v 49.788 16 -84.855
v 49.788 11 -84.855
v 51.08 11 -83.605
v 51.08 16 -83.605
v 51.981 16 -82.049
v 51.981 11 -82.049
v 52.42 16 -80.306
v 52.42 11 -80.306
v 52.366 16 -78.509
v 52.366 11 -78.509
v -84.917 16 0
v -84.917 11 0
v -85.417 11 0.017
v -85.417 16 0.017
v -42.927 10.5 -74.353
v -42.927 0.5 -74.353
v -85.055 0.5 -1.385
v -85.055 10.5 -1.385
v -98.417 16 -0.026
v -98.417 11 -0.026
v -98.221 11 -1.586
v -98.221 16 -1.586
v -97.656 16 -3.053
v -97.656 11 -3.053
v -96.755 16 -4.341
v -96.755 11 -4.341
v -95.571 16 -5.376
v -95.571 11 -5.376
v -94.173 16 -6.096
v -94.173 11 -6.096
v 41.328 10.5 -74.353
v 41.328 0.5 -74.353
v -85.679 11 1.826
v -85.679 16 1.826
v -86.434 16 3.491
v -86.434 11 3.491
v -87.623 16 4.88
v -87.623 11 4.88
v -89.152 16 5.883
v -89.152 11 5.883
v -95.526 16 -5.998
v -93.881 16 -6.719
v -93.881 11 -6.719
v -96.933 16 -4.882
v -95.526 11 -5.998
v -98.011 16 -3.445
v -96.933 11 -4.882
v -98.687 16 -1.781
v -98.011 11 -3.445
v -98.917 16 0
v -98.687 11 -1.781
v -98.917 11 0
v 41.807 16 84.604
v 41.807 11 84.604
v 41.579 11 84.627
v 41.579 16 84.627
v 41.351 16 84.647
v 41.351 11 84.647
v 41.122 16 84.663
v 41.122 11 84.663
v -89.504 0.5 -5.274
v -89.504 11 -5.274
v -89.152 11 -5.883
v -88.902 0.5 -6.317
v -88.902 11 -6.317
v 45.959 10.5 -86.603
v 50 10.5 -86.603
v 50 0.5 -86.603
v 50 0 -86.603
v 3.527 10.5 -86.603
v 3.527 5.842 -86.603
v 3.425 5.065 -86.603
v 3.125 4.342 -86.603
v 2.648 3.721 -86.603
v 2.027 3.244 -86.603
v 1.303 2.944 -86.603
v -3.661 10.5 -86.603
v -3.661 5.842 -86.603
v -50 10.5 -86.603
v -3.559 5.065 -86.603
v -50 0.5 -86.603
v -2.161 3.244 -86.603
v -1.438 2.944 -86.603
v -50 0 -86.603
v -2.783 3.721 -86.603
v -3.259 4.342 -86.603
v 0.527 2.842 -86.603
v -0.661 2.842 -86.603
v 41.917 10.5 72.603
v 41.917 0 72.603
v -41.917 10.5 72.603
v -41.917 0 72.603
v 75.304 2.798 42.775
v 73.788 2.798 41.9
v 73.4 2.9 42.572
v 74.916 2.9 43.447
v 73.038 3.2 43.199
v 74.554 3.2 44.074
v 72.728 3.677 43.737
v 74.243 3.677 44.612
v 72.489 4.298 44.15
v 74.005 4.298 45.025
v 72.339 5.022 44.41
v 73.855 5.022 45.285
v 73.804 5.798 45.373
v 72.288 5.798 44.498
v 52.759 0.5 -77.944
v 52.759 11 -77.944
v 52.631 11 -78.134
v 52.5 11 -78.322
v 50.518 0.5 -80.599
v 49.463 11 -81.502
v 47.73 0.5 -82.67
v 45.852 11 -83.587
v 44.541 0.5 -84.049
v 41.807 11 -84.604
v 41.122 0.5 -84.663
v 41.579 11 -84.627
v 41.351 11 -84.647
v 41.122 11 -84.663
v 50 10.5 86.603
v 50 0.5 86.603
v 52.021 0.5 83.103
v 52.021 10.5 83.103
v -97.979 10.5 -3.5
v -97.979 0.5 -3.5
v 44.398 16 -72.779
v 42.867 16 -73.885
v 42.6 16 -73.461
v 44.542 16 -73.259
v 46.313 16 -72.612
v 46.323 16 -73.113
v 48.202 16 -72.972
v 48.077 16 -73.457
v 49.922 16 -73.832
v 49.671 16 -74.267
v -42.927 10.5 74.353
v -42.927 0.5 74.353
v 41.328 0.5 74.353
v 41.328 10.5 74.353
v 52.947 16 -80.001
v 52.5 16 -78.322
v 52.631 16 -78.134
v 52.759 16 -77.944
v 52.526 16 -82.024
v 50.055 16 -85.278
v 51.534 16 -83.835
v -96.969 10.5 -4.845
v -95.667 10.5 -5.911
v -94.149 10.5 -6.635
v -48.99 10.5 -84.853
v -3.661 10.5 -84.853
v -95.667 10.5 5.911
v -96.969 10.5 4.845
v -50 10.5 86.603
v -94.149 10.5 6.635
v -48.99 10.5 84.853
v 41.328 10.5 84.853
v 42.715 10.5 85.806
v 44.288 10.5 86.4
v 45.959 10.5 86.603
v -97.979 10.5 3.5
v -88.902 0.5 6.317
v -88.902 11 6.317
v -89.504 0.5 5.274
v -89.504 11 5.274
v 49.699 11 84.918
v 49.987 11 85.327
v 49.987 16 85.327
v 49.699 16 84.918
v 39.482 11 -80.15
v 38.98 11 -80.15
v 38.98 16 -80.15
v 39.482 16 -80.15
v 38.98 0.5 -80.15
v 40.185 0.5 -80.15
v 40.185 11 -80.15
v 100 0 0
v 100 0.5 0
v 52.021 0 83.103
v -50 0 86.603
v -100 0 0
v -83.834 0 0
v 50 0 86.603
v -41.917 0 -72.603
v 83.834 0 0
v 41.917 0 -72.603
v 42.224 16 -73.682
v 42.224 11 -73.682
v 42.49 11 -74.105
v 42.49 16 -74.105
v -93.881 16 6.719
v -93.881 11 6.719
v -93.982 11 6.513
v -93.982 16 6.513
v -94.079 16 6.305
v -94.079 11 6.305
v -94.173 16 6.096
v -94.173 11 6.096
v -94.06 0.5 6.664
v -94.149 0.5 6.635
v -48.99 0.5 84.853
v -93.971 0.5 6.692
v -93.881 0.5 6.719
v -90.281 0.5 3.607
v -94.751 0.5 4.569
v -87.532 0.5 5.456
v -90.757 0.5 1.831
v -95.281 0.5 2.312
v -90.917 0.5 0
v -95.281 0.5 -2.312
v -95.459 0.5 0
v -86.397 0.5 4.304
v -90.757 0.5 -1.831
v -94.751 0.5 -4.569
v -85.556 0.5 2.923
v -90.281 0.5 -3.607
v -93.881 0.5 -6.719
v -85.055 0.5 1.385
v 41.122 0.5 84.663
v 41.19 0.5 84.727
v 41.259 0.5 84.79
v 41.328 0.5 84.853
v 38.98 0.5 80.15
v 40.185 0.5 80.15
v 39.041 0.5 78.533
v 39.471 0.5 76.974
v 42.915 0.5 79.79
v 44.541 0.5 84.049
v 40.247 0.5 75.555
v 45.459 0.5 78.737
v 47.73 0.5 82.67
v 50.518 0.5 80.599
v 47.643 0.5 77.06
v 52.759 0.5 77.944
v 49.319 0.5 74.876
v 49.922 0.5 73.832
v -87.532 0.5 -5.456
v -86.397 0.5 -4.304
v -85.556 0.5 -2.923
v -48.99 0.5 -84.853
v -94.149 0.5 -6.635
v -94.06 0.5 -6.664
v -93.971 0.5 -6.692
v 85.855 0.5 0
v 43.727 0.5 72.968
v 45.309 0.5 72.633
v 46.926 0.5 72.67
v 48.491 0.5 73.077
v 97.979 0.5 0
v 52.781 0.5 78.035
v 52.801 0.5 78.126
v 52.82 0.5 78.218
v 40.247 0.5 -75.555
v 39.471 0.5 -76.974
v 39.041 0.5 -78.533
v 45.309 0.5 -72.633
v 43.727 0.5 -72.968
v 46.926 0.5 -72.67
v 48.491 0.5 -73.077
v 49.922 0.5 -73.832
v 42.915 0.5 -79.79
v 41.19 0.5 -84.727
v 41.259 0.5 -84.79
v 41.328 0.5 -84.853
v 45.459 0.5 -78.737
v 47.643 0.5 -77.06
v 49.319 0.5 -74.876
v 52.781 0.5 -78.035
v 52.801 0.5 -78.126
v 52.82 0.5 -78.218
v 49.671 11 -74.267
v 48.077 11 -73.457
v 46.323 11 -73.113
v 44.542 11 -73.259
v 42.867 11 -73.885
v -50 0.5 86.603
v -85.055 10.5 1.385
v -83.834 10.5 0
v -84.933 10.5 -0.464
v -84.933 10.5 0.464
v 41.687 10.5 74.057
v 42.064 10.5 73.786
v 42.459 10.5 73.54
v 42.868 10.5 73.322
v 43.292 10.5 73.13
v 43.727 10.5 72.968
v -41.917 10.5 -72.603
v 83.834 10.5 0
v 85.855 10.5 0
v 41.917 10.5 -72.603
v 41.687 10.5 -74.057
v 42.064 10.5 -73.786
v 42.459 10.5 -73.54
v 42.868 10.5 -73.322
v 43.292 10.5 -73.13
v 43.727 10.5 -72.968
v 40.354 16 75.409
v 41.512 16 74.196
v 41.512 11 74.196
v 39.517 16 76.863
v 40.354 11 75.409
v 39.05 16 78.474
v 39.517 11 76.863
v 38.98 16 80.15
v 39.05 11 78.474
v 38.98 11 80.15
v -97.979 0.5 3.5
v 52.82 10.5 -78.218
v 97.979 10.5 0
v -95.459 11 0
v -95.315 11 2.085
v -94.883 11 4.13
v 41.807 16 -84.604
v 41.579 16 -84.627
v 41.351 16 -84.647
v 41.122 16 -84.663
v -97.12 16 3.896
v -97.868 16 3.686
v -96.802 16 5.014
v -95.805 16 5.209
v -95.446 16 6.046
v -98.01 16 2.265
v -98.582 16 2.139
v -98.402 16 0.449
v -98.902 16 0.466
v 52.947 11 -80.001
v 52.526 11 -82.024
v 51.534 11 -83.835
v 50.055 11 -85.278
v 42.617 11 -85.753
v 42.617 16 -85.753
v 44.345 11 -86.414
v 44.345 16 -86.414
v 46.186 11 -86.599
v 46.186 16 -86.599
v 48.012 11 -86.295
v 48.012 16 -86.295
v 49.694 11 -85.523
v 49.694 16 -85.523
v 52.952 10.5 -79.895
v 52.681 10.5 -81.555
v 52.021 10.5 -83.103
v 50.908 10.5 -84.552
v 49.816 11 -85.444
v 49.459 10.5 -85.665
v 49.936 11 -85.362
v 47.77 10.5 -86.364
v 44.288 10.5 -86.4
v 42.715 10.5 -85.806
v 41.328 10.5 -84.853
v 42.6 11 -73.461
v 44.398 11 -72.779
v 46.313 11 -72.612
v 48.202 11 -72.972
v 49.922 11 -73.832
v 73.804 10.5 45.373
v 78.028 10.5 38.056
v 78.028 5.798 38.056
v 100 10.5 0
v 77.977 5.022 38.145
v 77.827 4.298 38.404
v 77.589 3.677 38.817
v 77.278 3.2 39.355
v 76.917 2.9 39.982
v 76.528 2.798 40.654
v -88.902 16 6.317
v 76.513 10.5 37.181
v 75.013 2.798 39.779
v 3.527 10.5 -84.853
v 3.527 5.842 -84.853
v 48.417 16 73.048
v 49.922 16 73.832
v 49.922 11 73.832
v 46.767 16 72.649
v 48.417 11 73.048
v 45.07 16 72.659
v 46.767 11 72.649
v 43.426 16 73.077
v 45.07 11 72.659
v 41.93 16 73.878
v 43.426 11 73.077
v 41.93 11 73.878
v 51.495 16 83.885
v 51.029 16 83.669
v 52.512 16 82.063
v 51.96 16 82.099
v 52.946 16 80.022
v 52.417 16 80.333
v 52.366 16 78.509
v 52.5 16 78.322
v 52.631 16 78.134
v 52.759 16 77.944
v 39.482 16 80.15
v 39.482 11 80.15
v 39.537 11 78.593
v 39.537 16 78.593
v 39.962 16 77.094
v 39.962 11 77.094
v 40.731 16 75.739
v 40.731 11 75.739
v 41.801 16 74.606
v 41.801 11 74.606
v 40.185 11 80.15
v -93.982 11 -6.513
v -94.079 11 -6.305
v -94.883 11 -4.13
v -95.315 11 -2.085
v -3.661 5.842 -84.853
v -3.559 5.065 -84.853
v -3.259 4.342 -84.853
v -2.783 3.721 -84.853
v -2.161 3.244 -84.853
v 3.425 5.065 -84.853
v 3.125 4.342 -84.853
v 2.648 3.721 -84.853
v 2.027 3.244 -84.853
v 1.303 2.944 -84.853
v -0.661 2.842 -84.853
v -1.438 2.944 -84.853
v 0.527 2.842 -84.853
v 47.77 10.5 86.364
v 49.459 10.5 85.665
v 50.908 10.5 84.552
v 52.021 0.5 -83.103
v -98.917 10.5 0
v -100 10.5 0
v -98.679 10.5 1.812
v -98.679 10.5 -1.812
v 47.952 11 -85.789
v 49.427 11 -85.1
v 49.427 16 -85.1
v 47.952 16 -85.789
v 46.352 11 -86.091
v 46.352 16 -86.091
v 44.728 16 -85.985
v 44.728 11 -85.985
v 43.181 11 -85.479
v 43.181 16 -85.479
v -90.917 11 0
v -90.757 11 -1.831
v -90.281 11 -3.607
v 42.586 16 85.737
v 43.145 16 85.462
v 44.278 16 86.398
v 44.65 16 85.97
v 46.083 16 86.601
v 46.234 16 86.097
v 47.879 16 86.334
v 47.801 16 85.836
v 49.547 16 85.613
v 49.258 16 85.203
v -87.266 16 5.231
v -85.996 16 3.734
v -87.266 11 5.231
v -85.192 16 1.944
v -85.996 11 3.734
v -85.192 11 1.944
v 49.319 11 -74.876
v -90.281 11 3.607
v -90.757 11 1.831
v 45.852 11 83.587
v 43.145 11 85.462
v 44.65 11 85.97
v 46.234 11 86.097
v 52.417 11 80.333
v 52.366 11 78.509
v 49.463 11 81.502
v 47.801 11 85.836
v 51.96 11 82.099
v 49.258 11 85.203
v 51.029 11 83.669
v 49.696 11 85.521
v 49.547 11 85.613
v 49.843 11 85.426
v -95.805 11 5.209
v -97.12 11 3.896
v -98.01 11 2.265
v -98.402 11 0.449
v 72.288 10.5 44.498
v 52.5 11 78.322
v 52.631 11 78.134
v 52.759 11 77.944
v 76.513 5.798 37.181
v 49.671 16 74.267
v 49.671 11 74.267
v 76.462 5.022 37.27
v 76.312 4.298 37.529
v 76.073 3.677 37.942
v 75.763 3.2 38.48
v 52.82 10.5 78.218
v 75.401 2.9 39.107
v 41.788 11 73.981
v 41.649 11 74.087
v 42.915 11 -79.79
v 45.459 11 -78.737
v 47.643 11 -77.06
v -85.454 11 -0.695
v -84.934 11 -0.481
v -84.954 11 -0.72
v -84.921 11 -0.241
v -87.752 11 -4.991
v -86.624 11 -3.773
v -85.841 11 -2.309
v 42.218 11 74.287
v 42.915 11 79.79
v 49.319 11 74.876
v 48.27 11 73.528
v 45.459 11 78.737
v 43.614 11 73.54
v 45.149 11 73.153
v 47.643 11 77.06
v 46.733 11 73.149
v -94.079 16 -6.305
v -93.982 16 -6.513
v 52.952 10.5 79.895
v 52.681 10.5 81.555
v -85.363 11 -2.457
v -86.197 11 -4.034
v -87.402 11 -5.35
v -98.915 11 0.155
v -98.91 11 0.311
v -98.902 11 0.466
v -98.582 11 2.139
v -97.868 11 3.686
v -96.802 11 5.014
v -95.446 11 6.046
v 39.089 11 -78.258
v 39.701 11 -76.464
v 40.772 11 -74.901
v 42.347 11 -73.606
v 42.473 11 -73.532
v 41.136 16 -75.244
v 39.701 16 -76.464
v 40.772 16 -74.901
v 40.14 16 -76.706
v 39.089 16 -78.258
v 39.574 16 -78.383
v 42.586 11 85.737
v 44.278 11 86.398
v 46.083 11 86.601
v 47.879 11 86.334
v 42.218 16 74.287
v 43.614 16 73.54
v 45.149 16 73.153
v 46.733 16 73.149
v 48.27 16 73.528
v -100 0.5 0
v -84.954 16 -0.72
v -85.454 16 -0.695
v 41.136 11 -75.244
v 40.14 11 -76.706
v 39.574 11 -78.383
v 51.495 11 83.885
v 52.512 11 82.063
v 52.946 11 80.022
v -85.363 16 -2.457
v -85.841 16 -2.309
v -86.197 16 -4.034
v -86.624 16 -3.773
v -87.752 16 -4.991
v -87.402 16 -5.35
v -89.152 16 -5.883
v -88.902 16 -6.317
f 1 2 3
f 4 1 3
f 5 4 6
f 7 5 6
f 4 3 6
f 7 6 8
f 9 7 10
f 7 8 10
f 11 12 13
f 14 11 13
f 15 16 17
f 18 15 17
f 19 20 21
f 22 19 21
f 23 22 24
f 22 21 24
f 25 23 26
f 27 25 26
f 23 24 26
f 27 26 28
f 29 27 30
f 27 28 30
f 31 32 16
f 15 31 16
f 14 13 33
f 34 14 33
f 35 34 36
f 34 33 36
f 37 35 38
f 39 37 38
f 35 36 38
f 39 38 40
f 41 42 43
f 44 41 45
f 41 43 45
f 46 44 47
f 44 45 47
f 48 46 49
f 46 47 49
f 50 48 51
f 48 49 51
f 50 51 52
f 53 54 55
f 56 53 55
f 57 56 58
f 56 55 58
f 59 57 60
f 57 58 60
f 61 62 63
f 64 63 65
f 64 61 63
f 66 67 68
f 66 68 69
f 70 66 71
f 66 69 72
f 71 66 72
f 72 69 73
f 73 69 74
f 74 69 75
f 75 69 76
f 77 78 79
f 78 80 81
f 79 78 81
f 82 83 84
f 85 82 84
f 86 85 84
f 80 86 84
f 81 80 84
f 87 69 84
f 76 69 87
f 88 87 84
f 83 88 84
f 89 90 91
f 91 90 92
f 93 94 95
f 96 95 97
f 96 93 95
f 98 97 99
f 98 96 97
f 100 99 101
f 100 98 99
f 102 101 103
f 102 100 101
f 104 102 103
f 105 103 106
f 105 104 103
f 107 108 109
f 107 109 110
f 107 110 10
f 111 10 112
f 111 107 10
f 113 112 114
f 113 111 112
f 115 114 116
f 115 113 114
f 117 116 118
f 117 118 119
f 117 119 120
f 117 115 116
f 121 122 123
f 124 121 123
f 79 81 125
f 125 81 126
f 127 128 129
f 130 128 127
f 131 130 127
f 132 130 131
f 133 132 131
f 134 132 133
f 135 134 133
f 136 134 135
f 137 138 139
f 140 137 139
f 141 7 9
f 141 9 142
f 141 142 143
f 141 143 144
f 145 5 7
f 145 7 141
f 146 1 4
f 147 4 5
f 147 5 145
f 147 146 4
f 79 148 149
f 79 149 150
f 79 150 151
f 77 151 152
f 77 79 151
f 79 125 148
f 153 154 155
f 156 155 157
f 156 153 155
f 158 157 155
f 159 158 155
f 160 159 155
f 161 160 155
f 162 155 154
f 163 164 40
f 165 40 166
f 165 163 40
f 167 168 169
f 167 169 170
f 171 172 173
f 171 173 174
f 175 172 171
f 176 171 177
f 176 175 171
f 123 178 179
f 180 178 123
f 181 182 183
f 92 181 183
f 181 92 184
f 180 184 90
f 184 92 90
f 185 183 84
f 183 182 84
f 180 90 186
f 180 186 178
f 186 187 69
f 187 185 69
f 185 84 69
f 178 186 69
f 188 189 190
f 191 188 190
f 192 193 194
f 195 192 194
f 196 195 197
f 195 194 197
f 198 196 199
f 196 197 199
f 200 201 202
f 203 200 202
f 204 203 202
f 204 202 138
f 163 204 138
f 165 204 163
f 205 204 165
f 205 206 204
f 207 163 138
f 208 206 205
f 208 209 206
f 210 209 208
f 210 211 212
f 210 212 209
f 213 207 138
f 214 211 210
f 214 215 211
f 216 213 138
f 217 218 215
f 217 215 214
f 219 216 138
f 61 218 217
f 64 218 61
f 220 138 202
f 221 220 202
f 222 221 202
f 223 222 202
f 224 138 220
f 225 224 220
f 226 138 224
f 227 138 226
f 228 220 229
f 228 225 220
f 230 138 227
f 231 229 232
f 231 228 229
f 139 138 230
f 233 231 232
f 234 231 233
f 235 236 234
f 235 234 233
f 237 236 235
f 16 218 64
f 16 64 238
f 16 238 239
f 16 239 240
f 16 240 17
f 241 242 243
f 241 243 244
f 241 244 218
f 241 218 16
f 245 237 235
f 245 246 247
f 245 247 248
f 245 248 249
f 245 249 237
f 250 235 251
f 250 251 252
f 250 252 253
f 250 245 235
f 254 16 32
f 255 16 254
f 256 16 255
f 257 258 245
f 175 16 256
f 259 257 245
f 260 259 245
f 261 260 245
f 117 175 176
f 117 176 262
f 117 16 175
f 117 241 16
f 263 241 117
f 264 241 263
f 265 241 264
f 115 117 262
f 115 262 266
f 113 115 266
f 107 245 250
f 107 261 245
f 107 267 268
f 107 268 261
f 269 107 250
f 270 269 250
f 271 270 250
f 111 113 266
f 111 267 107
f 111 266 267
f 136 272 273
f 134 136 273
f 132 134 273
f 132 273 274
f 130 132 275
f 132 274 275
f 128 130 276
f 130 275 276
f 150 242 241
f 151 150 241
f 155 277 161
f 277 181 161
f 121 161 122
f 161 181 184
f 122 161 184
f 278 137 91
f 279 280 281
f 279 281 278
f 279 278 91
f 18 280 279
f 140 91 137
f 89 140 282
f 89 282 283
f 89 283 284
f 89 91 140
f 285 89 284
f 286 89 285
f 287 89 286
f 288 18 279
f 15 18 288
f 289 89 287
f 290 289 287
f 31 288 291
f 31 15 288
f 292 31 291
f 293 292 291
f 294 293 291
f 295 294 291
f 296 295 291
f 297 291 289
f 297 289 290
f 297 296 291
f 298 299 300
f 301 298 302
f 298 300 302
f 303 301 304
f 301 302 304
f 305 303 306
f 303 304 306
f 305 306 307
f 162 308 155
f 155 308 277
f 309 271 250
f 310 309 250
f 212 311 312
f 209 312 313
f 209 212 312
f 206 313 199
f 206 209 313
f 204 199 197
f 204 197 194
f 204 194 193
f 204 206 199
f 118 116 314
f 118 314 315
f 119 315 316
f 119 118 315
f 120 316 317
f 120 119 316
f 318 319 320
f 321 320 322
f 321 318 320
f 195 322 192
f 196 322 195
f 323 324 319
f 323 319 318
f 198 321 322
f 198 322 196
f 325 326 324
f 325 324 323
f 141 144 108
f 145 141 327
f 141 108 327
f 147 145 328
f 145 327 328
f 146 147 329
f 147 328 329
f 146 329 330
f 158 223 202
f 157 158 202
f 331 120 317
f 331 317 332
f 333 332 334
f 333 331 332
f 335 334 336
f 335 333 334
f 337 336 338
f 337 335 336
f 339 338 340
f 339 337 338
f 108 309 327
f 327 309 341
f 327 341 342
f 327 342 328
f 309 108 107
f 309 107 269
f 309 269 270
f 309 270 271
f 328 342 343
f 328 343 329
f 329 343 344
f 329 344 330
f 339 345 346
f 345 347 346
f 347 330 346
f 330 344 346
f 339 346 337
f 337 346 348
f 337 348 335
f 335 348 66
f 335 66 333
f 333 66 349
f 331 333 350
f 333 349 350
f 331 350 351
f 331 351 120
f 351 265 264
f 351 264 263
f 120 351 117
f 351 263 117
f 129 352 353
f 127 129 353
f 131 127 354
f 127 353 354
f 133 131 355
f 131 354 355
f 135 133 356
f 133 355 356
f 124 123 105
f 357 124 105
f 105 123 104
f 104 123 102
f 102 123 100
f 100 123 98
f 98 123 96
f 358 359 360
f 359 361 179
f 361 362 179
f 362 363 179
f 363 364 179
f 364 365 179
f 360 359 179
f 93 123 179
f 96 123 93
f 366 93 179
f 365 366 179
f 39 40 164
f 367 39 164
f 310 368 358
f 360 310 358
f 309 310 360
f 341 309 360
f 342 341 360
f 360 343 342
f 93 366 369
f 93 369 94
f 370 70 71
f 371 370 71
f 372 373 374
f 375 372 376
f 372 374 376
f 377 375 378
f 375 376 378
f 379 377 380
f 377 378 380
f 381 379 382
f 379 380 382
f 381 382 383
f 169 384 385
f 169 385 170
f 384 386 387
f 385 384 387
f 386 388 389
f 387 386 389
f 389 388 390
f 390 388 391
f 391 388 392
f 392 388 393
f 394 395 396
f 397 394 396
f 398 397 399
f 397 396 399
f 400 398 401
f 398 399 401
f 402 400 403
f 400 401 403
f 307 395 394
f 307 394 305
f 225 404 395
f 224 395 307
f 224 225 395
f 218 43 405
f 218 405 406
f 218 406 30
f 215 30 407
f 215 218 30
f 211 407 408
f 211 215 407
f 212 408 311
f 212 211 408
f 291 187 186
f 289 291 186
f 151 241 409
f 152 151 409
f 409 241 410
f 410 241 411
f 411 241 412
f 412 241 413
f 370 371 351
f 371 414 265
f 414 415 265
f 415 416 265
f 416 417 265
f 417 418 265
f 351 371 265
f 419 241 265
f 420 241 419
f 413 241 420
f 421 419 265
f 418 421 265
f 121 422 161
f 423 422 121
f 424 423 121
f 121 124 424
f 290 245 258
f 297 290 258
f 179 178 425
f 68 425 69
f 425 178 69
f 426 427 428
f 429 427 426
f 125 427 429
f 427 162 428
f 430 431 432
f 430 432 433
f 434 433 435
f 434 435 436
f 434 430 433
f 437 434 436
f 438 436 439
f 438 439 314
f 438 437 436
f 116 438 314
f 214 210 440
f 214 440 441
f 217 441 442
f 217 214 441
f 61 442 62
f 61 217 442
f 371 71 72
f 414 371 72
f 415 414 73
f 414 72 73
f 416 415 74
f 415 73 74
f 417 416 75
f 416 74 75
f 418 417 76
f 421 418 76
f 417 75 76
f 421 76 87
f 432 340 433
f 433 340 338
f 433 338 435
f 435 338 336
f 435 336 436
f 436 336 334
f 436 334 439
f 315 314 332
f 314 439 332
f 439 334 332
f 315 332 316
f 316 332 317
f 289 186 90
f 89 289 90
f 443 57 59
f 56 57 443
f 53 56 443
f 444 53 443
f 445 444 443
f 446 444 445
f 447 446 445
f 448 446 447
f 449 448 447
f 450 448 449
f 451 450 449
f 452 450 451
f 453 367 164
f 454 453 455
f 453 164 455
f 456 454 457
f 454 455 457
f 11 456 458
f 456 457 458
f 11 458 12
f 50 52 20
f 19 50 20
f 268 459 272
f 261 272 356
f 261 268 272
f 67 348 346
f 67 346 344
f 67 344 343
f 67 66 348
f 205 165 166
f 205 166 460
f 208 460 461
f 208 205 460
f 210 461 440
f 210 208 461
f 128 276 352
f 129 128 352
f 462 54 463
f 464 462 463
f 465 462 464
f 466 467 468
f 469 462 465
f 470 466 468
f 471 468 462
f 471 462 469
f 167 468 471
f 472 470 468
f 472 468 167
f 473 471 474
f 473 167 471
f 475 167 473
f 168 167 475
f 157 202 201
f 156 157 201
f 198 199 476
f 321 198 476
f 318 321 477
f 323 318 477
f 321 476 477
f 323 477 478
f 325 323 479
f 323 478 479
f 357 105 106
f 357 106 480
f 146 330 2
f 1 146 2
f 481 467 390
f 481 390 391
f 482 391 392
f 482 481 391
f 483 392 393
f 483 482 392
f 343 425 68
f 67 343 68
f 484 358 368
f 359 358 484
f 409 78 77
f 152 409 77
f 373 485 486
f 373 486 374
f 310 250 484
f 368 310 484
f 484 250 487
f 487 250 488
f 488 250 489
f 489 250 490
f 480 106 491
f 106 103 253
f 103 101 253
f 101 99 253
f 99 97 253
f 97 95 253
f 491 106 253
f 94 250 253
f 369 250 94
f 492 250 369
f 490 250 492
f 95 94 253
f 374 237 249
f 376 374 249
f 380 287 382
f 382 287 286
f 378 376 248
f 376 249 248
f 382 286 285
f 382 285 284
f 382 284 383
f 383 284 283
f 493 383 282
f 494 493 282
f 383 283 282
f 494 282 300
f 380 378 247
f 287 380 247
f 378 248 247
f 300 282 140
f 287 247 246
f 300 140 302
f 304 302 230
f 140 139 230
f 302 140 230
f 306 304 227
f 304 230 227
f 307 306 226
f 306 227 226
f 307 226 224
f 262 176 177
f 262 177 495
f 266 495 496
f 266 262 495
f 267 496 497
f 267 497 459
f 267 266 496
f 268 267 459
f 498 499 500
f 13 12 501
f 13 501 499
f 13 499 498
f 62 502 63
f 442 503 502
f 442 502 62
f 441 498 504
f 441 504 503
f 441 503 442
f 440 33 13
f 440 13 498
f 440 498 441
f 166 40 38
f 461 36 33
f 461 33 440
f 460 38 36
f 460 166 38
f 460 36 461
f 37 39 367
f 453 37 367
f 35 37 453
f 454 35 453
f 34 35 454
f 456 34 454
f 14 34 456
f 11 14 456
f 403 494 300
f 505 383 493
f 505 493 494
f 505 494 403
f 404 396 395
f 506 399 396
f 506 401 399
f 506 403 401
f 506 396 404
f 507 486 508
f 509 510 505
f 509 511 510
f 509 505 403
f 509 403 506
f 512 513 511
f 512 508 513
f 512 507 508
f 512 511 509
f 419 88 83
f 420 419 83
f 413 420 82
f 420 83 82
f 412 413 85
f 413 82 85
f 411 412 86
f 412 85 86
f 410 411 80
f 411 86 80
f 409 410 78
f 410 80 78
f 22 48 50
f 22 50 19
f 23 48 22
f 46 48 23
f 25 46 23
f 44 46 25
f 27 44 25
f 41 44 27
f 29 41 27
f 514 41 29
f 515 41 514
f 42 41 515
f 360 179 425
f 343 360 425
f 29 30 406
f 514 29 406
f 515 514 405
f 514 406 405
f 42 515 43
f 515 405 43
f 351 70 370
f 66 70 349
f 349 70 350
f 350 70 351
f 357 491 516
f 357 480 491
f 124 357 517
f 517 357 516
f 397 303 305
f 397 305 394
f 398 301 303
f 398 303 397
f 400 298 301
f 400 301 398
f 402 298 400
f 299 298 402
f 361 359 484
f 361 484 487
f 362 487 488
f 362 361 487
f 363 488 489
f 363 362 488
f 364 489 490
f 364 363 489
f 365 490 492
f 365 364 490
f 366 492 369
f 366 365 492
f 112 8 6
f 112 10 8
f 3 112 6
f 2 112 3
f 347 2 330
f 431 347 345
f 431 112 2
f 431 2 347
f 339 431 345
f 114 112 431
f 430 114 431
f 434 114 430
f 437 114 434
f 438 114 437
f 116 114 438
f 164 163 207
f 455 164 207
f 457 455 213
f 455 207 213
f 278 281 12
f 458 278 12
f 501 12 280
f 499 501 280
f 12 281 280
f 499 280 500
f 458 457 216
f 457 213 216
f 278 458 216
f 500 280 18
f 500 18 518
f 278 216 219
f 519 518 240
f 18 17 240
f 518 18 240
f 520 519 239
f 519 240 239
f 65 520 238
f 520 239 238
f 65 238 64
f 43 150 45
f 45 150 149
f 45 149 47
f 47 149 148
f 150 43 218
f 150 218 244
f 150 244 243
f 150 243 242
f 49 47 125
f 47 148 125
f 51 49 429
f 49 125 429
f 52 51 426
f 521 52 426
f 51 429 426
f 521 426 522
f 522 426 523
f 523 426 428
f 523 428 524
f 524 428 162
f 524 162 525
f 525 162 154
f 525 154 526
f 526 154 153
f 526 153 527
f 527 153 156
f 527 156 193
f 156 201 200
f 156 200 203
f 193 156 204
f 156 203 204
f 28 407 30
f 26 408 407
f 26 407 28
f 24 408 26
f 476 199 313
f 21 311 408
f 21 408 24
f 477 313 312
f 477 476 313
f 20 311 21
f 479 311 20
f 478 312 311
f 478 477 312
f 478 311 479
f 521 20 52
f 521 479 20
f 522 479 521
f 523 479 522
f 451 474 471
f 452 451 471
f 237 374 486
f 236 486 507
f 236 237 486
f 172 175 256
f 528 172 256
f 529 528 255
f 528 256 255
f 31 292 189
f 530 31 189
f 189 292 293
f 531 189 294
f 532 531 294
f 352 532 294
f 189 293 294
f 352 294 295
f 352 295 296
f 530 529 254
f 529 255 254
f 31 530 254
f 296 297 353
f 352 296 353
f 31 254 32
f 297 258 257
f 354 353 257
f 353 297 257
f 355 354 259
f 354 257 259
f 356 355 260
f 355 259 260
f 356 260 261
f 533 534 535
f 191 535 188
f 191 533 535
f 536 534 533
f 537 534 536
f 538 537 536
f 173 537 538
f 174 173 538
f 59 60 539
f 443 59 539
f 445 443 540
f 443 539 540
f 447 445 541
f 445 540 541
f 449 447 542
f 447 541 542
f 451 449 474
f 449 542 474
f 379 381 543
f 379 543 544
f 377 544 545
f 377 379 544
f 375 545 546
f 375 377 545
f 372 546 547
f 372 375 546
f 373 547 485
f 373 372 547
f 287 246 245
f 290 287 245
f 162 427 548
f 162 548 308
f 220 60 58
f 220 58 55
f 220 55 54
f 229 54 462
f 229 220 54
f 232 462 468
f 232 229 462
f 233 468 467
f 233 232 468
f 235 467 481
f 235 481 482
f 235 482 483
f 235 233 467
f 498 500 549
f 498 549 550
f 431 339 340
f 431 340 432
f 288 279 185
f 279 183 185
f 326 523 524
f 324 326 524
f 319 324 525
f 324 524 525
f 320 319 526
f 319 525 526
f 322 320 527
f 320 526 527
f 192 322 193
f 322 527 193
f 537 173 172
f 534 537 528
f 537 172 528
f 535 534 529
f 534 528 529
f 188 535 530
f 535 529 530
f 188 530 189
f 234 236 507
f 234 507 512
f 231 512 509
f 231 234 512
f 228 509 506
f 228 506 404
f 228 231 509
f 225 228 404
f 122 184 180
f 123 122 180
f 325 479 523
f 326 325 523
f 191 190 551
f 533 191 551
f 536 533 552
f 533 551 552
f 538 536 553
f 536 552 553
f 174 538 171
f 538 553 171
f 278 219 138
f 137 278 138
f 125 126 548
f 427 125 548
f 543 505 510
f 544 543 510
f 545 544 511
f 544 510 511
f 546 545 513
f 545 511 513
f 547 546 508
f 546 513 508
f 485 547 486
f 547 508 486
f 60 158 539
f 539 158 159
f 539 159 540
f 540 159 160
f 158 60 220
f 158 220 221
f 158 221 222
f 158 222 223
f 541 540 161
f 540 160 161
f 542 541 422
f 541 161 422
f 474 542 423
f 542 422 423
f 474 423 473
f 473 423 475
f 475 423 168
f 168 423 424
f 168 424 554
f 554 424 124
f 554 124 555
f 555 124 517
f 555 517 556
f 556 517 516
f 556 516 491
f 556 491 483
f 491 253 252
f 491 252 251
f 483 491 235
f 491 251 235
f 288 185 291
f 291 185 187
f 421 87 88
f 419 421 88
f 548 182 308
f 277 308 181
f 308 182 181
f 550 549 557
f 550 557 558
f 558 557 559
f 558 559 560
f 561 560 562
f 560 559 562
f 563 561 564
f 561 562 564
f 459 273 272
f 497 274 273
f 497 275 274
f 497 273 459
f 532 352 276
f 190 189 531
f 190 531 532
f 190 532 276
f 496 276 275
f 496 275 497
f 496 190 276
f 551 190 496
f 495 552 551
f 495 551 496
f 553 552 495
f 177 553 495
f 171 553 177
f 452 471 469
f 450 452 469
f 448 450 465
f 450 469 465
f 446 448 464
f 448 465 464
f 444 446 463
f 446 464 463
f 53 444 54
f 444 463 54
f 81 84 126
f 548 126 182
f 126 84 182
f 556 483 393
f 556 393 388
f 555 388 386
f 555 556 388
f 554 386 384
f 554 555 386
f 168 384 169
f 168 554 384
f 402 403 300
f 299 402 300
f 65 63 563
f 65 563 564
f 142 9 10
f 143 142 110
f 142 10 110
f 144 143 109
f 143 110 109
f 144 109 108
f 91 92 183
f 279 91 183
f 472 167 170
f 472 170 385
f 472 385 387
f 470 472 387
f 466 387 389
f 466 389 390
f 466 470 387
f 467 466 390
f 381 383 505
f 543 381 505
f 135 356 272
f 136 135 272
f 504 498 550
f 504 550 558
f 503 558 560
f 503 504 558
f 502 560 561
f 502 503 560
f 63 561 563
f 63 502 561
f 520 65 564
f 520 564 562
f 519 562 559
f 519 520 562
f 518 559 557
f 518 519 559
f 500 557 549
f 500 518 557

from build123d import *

# Parameters (mm, degrees)
SKETCH1_R            = 7
BOSS_EXTRUDE1_DEPTH  = 0.5
SKETCH1_3_R          = 7
BOSS_EXTRUDE2_DEPTH  = 11
BOSS_EXTRUDE9_DEPTH  = 10
CUT_SWEEP1_START     = 0.5
CUT_SWEEP1_DEPTH     = 10.5
BOSS_EXTRUDE10_DEPTH = 5
CUT_EXTRUDE1_DEPTH   = 3
CUT_EXTRUDE2_DEPTH   = 3


# Read off the part's stored shape, not the designer's step: Cut-Sweep1
with BuildPart() as part:
    # Sketch1 → Boss-Extrude1 (new body)
    with BuildSketch(Plane(origin=(0, 0, 0), x_dir=(1, 0, 0), z_dir=(0, 1, 0))):
        with Locations((45.958548116, 79.602540378)):
            Circle(SKETCH1_R)
        with Locations((-91.917096231, 0)):
            Circle(SKETCH1_R)
        Polygon((50, 86.602540378), (-50, 86.602540378), (-100, 0), (-83.834192463, 0), (-41.917096231, 72.602540378), (41.917096231, 72.602540378), align=None)
        with Locations((45.958548116, -79.602540378)):
            Circle(SKETCH1_R)
        with Locations((-91.917096231, 0)):
            Circle(SKETCH1_R)
        Polygon((41.917096231, -72.602540378), (50, -86.602540378), (-50, -86.602540378), (-100, 0), (-83.834192463, 0), (-41.917096231, -72.602540378), align=None)
        with BuildLine():
            ThreePointArc((-97.979274108, -3.499999913), (-90.105362964, -6.761480797), (-84.917096231, 0))
            Line((-84.917096231, 0), (-98.917096231, 0))
            ThreePointArc((-98.917096231, 0), (-98.678577028, -1.811733267), (-97.979274108, -3.499999913))
        make_face()
        with BuildLine():
            Line((-98.917096231, 0), (-84.917096231, 0))
            ThreePointArc((-84.917096231, 0), (-90.105363649, 6.76148098), (-97.979274817, 3.499998686))
            ThreePointArc((-97.979274817, 3.499998686), (-98.678577212, 1.811732583), (-98.917096231, 0))
        make_face()
        with BuildLine():
            ThreePointArc((-97.979274108, -3.499999913), (-90.105362964, -6.761480797), (-84.917096231, 0))
            Line((-84.917096231, 0), (-98.917096231, 0))
            ThreePointArc((-98.917096231, 0), (-98.678577028, -1.811733267), (-97.979274108, -3.499999913))
        make_face()
        with BuildLine():
            Line((-98.917096231, 0), (-84.917096231, 0))
            ThreePointArc((-84.917096231, 0), (-90.105363649, 6.76148098), (-97.979274817, 3.499998686))
            ThreePointArc((-97.979274817, 3.499998686), (-98.678577212, 1.811732583), (-98.917096231, 0))
        make_face()
        with BuildLine():
            ThreePointArc((42.458548116, -73.540362552), (39.197067327, -81.414273677), (45.95854808, -86.602540378))
            ThreePointArc((45.95854808, -86.602540378), (47.770281414, -86.364021167), (49.458548116, -85.664718205))
            Line((49.458548116, -85.664718205), (42.458548116, -73.540362552))
        make_face()
        with BuildLine():
            ThreePointArc((52.958548116, -79.602540378), (49.458548116, -73.540362552), (42.458548116, -73.540362552))
            Line((42.458548116, -73.540362552), (49.458548116, -85.664718205))
            ThreePointArc((49.458548116, -85.664718205), (50.908295282, -84.552288149), (52.020725515, -83.102541119))
            ThreePointArc((52.020725515, -83.102541119), (52.720028789, -81.414274107), (52.958548116, -79.602540378))
        make_face()
        with BuildLine():
            ThreePointArc((42.458548116, -73.540362552), (39.197067327, -81.414273677), (45.95854808, -86.602540378))
            ThreePointArc((45.95854808, -86.602540378), (47.770281414, -86.364021167), (49.458548116, -85.664718205))
            Line((49.458548116, -85.664718205), (42.458548116, -73.540362552))
        make_face()
        with BuildLine():
            ThreePointArc((52.958548116, -79.602540378), (49.458548116, -73.540362552), (42.458548116, -73.540362552))
            Line((42.458548116, -73.540362552), (49.458548116, -85.664718205))
            ThreePointArc((49.458548116, -85.664718205), (50.908295282, -84.552288149), (52.020725515, -83.102541119))
            ThreePointArc((52.020725515, -83.102541119), (52.720028789, -81.414274107), (52.958548116, -79.602540378))
        make_face()
        with BuildLine():
            ThreePointArc((49.458548116, -85.664718205), (47.770281414, -86.364021167), (45.95854808, -86.602540378))
            Line((45.95854808, -86.602540378), (50, -86.602540378))
            Line((50, -86.602540378), (49.458548116, -85.664718205))
        make_face()
        with BuildLine():
            Line((49.458548116, -85.664718205), (50, -86.602540378))
            Line((50, -86.602540378), (52.020725515, -83.102541119))
            ThreePointArc((52.020725515, -83.102541119), (50.908295282, -84.552288149), (49.458548116, -85.664718205))
        make_face()
        with Locations((45.958548116, 79.602540378)):
            Circle(SKETCH1_R)
        with Locations((45.958548116, -79.602540378)):
            Circle(SKETCH1_R)
        Polygon((41.917096231, 72.602540378), (50, 86.602540378), (100, 0), (50, -86.602540378), (41.917096231, -72.602540378), (83.834192463, 0), align=None)
        with BuildLine():
            Line((50, 86.602540378), (45.958548152, 86.602540378))
            ThreePointArc((45.958548152, 86.602540378), (47.770281449, 86.364021158), (49.458548116, 85.664718205))
            Line((49.458548116, 85.664718205), (50, 86.602540378))
        make_face()
        with BuildLine():
            Line((52.020726965, 83.102538606), (50, 86.602540378))
            Line((50, 86.602540378), (49.458548116, 85.664718205))
            ThreePointArc((49.458548116, 85.664718205), (50.908296308, 84.552287123), (52.020726965, 83.102538606))
        make_face()
        with BuildLine():
            ThreePointArc((49.458548116, 85.664718205), (47.770281449, 86.364021158), (45.958548152, 86.602540378))
            ThreePointArc((45.958548152, 86.602540378), (39.197067336, 81.414273712), (42.458548116, 73.540362552))
            Line((42.458548116, 73.540362552), (49.458548116, 85.664718205))
        make_face()
        with BuildLine():
            Line((49.458548116, 85.664718205), (42.458548116, 73.540362552))
            ThreePointArc((42.458548116, 73.540362552), (49.458548116, 73.540362552), (52.958548116, 79.602540378))
            ThreePointArc((52.958548116, 79.602540378), (52.720029165, 81.414272706), (52.020726965, 83.102538606))
            ThreePointArc((52.020726965, 83.102538606), (50.908296308, 84.552287123), (49.458548116, 85.664718205))
        make_face()
        with BuildLine():
            ThreePointArc((49.458548116, 85.664718205), (47.770281449, 86.364021158), (45.958548152, 86.602540378))
            ThreePointArc((45.958548152, 86.602540378), (39.197067336, 81.414273712), (42.458548116, 73.540362552))
            Line((42.458548116, 73.540362552), (49.458548116, 85.664718205))
        make_face()
        with BuildLine():
            Line((49.458548116, 85.664718205), (42.458548116, 73.540362552))
            ThreePointArc((42.458548116, 73.540362552), (49.458548116, 73.540362552), (52.958548116, 79.602540378))
            ThreePointArc((52.958548116, 79.602540378), (52.720029165, 81.414272706), (52.020726965, 83.102538606))
            ThreePointArc((52.020726965, 83.102538606), (50.908296308, 84.552287123), (49.458548116, 85.664718205))
        make_face()
        with BuildLine():
            Line((-100, 0), (-98.917096231, 0))
            ThreePointArc((-98.917096231, 0), (-98.678577212, 1.811732583), (-97.979274817, 3.499998686))
            Line((-97.979274817, 3.499998686), (-100, 0))
        make_face()
        with BuildLine():
            ThreePointArc((-97.979274108, -3.499999913), (-98.678577028, -1.811733267), (-98.917096231, 0))
            Line((-98.917096231, 0), (-100, 0))
            Line((-100, 0), (-97.979274108, -3.499999913))
        make_face()
    extrude(amount=BOSS_EXTRUDE1_DEPTH)

    # Sketch1<3> → Boss-Extrude2 (add)
    with BuildSketch(Plane(origin=(0, 0, 0), x_dir=(1, 0, 0), z_dir=(0, 1, 0))):
        with Locations(Location((-91.917096231, 0, 0), (0, 0, 150))):
            Circle(SKETCH1_3_R)
        with Locations(Location((45.958548116, -79.602540378, 0), (0, 0, 270))):
            Circle(SKETCH1_3_R)
        with Locations(Location((45.958548116, 79.602540378, 0), (0, 0, 90))):
            Circle(SKETCH1_3_R)
    extrude(amount=BOSS_EXTRUDE2_DEPTH)

    # Sketch2 → Boss-Extrude9 (add)
    # profile 1 of 7: a face of its own
    with BuildSketch(Plane(origin=(0, 0.5, 0), x_dir=(1, 0, 0), z_dir=(0, 1, 0))):
        with BuildLine():
            Line((85.854918405, 0), (43.726947143, 72.967786645))
            ThreePointArc((43.726947143, 72.967786645), (43.078483321, 73.222475584), (42.458548116, 73.540362552))
            ThreePointArc((42.458548116, 73.540362552), (41.873282323, 73.918298705), (41.328483321, 74.352540378))
            Line((41.328483321, 74.352540378), (-42.927459202, 74.352540378))
            Line((-42.927459202, 74.352540378), (-85.055430464, 1.384753733))
            ThreePointArc((-85.055430464, 1.384753733), (-84.917096231, 0), (-85.055430464, -1.384753733))
            Line((-85.055430464, -1.384753733), (-42.927459202, -74.352540378))
            Line((-42.927459202, -74.352540378), (41.328483321, -74.352540378))
            ThreePointArc((41.328483321, -74.352540378), (41.873282323, -73.918298705), (42.458548116, -73.540362552))
            ThreePointArc((42.458548116, -73.540362552), (43.078483321, -73.222475584), (43.726947143, -72.967786645))
            Line((43.726947143, -72.967786645), (85.854918405, 0))
        make_face()
        Polygon((-83.834192463, 0), (-41.917096231, 72.602540378), (41.917096231, 72.602540378), (83.834192463, 0), (41.917096231, -72.602540378), (-41.917096231, -72.602540378), align=None, mode=Mode.SUBTRACT)
    # profile 2 of 7: a face of its own
    with BuildSketch(Plane(origin=(0, 0.5, 0), x_dir=(1, 0, 0), z_dir=(0, 1, 0))):
        with BuildLine():
            ThreePointArc((41.328483321, 84.852540378), (43.483674382, 86.150440805), (45.958548116, 86.602540378))
            Line((45.958548116, 86.602540378), (-50, 86.602540378))
            Line((-50, 86.602540378), (-97.979274058, 3.5))
            ThreePointArc((-97.979274058, 3.5), (-96.350307475, 5.417253738), (-94.148697204, 6.634753733))
            Line((-94.148697204, 6.634753733), (-48.989637029, 84.852540378))
            Line((-48.989637029, 84.852540378), (41.328483321, 84.852540378))
        make_face()
    # profile 3 of 7: a face of its own
    with BuildSketch(Plane(origin=(0, 0.5, 0), x_dir=(1, 0, 0), z_dir=(0, 1, 0))):
        with BuildLine():
            ThreePointArc((-94.148697204, 6.634753733), (-96.350307475, 5.417253738), (-97.979274058, 3.5))
            Line((-97.979274058, 3.5), (-100, 0))
            Line((-100, 0), (-97.979274058, -3.5))
            ThreePointArc((-97.979274058, -3.5), (-96.350307475, -5.417253738), (-94.148697204, -6.634753733))
            Line((-94.148697204, -6.634753733), (-97.979274058, 0))
            Line((-97.979274058, 0), (-94.148697204, 6.634753733))
        make_face()
    # profile 4 of 7: a face of its own
    with BuildSketch(Plane(origin=(0, 0.5, 0), x_dir=(1, 0, 0), z_dir=(0, 1, 0))):
        with BuildLine():
            Line((-50, -86.602540378), (45.958548116, -86.602540378))
            ThreePointArc((45.958548116, -86.602540378), (43.483674382, -86.150440805), (41.328483321, -84.852540378))
            Line((41.328483321, -84.852540378), (-48.989637029, -84.852540378))
            Line((-48.989637029, -84.852540378), (-94.148697204, -6.634753733))
            ThreePointArc((-94.148697204, -6.634753733), (-96.350307475, -5.417253738), (-97.979274058, -3.5))
            Line((-97.979274058, -3.5), (-50, -86.602540378))
        make_face()
    # profile 5 of 7: a face of its own
    with BuildSketch(Plane(origin=(0, 0.5, 0), x_dir=(1, 0, 0), z_dir=(0, 1, 0))):
        with BuildLine():
            Line((50, -86.602540378), (52.020725942, -83.102540378))
            ThreePointArc((52.020725942, -83.102540378), (52.866633094, -80.733187067), (52.820213883, -78.217786645))
            Line((52.820213883, -78.217786645), (48.989637029, -84.852540378))
            Line((48.989637029, -84.852540378), (41.328483321, -84.852540378))
            ThreePointArc((41.328483321, -84.852540378), (43.483674382, -86.150440805), (45.958548116, -86.602540378))
            Line((45.958548116, -86.602540378), (50, -86.602540378))
        make_face()
    # profile 6 of 7: a face of its own
    with BuildSketch(Plane(origin=(0, 0.5, 0), x_dir=(1, 0, 0), z_dir=(0, 1, 0))):
        with BuildLine():
            Line((52.020725942, -83.102540378), (100, 0))
            Line((100, 0), (52.020725942, 83.102540378))
            ThreePointArc((52.020725942, 83.102540378), (52.866633094, 80.733187067), (52.820213883, 78.217786645))
            Line((52.820213883, 78.217786645), (97.979274058, 0))
            Line((97.979274058, 0), (52.820213883, -78.217786645))
            ThreePointArc((52.820213883, -78.217786645), (52.866633094, -80.733187067), (52.020725942, -83.102540378))
        make_face()
    # profile 7 of 7: a face of its own
    with BuildSketch(Plane(origin=(0, 0.5, 0), x_dir=(1, 0, 0), z_dir=(0, 1, 0))):
        with BuildLine():
            ThreePointArc((52.820213883, 78.217786645), (52.866633094, 80.733187067), (52.020725942, 83.102540378))
            Line((52.020725942, 83.102540378), (50, 86.602540378))
            Line((50, 86.602540378), (45.958548116, 86.602540378))
            ThreePointArc((45.958548116, 86.602540378), (43.483674382, 86.150440805), (41.328483321, 84.852540378))
            Line((41.328483321, 84.852540378), (48.989637029, 84.852540378))
            Line((48.989637029, 84.852540378), (52.820213883, 78.217786645))
        make_face()
    extrude(amount=BOSS_EXTRUDE9_DEPTH)

    # Cut-Sweep1 outline → Cut-Sweep1 (cut)
    with BuildSketch(Plane(origin=(0, 0, 0), x_dir=(1, 0, 0), z_dir=(0, 1, 0)).offset(CUT_SWEEP1_START)):
        with BuildLine():
            Line((38.979953336, 80.149545762), (40.185045424, 80.149545762))
            ThreePointArc((40.185045424, 80.149545762), (45.458548116, 78.736514975), (49.31902002, 74.87604307))
            Line((49.31902002, 74.87604307), (49.921566065, 73.832402707))
            ThreePointArc((49.921566065, 73.832402707), (51.719659537, 75.626412211), (52.759213307, 77.943940678))
            ThreePointArc((52.759213307, 77.943940678), (47.729723298, 82.670305783), (41.121826045, 84.662789346))
            ThreePointArc((41.121826045, 84.662789346), (39.634564405, 82.603745139), (38.979953336, 80.149545762))
        make_face()
        with BuildLine():
            Line((49.921566065, -73.832402707), (49.31902002, -74.87604307))
            ThreePointArc((49.31902002, -74.87604307), (45.458548116, -78.736514975), (40.185045424, -80.149545762))
            Line((40.185045424, -80.149545762), (38.979953336, -80.149545762))
            ThreePointArc((38.979953336, -80.149545762), (39.634564405, -82.603745139), (41.121826046, -84.662789345))
            ThreePointArc((41.121826046, -84.662789345), (47.729723298, -82.670305783), (52.759213306, -77.943940678))
            ThreePointArc((52.759213306, -77.943940678), (51.719659537, -75.626412211), (49.921566065, -73.832402707))
        make_face()
        with BuildLine():
            Line((-88.901519399, -6.317143055), (-89.504065444, -5.273502692))
            ThreePointArc((-89.504065444, -5.273502692), (-90.557715738, -2.729765862), (-90.917096231, 0))
            ThreePointArc((-90.917096231, 0), (-90.557715738, 2.729765862), (-89.504065444, 5.273502692))
            Line((-89.504065444, 5.273502692), (-88.901519399, 6.317143055))
            ThreePointArc((-88.901519399, 6.317143055), (-91.35422394, 6.977332928), (-93.881039351, 6.718848668))
            ThreePointArc((-93.881039351, 6.718848668), (-95.05954566, 3.450880209), (-95.459446596, 0))
            ThreePointArc((-95.459446596, 0), (-95.05954566, -3.450880209), (-93.881039351, -6.718848668))
            ThreePointArc((-93.881039351, -6.718848668), (-91.35422394, -6.977332928), (-88.901519399, -6.317143055))
        make_face()
    extrude(amount=CUT_SWEEP1_DEPTH, mode=Mode.SUBTRACT)

    # Sketch5 → Boss-Extrude10 (add)
    with BuildSketch(Plane(origin=(0, 11, 0), x_dir=(1, 0, 0), z_dir=(0, 1, 0))):
        with BuildLine():
            ThreePointArc((41.121826045, -84.662789346), (45.173960153, -86.558431531), (49.546546407, -85.613053523))
            Line((49.546546407, -85.613053523), (49.257916635, -85.202912453))
            ThreePointArc((49.257916635, -85.202912453), (45.438077094, -86.081669171), (41.807496677, -84.604417222))
            ThreePointArc((41.807496677, -84.604417222), (41.464994162, -84.637512547), (41.121826045, -84.662789346))
        make_face()
        with BuildLine():
            ThreePointArc((52.365826248, -78.508562802), (52.565738898, -78.228494586), (52.759213306, -77.943940678))
            ThreePointArc((52.759213306, -77.943940678), (52.511856072, -82.063059598), (49.987113815, -85.327106598))
            Line((49.987113815, -85.327106598), (49.699359122, -84.918209011))
            ThreePointArc((49.699359122, -84.918209011), (51.959949571, -82.099174228), (52.365826248, -78.508562802))
        make_face()
        with BuildLine():
            ThreePointArc((49.921566064, -73.832402708), (45.918631751, -72.602654188), (41.929982416, -73.877974159))
            Line((41.929982416, -73.877974159), (42.217737109, -74.286871746))
            ThreePointArc((42.217737109, -74.286871746), (45.94108332, -73.102563841), (49.670739961, -74.266846262))
            Line((49.670739961, -74.266846262), (49.921566064, -73.832402708))
        make_face()
        with BuildLine():
            Line((41.800725218, -74.60629091), (41.512095446, -74.19614984))
            ThreePointArc((41.512095446, -74.19614984), (39.516991001, -76.862769962), (38.979953335, -80.149545762))
            Line((38.979953335, -80.149545762), (39.481605541, -80.149545762))
            ThreePointArc((39.481605541, -80.149545762), (39.962176067, -77.093851029), (41.800725218, -74.60629091))
        make_face()
        with BuildLine():
            Line((42.867245524, 73.88468691), (42.599900531, 73.460921178))
            ThreePointArc((42.599900531, 73.460921178), (46.313252945, 72.611532977), (49.921566064, 73.832402708))
            Line((49.921566064, 73.832402708), (49.670739961, 74.266846262))
            ThreePointArc((49.670739961, 74.266846262), (46.323085232, 73.11277053), (42.867245524, 73.88468691))
        make_face()
        with BuildLine():
            Line((39.481605541, 80.149545762), (38.979953335, 80.149545762))
            ThreePointArc((38.979953335, 80.149545762), (39.701415902, 76.464340821), (42.223559002, 73.682248466))
            Line((42.223559002, 73.682248466), (42.490343939, 74.10512646))
            ThreePointArc((42.490343939, 74.10512646), (40.139593128, 76.706031644), (39.481605541, 80.149545762))
        make_face()
        with BuildLine():
            ThreePointArc((52.759213306, 77.943940678), (52.526465324, 82.023792854), (50.055348986, 85.278474013))
            Line((50.055348986, 85.278474013), (49.788003994, 84.854708281))
            ThreePointArc((49.788003994, 84.854708281), (51.980679915, 82.048747359), (52.365826248, 78.508562802))
            ThreePointArc((52.365826248, 78.508562802), (52.565738898, 78.228494586), (52.759213306, 77.943940678))
        make_face()
        with BuildLine():
            ThreePointArc((41.807496677, 84.604417222), (41.464994162, 84.637512547), (41.121826045, 84.662789346))
            ThreePointArc((41.121826045, 84.662789346), (45.259711694, 86.567569284), (49.693537229, 85.52283229))
            Line((49.693537229, 85.52283229), (49.426752292, 85.099954297))
            ThreePointArc((49.426752292, 85.099954297), (45.536695838, 86.088836753), (41.807496677, 84.604417222))
        make_face()
        with BuildLine():
            Line((-98.401550079, -0.449286427), (-98.90157143, -0.465946561))
            ThreePointArc((-98.90157143, -0.465946561), (-97.375415001, -4.382551335), (-93.881039351, -6.718848668))
            ThreePointArc((-93.881039351, -6.718848668), (-94.03073306, -6.409017961), (-94.173322925, -6.09585442))
            ThreePointArc((-94.173322925, -6.09585442), (-97.120057562, -3.896048433), (-98.401550079, -0.449286427))
        make_face()
        with BuildLine():
            Line((-89.152345503, -5.8826995), (-88.901519399, -6.317143055))
            ThreePointArc((-88.901519399, -6.317143055), (-85.996410552, -3.734364884), (-84.917096231, 0))
            Line((-84.917096231, 0), (-85.417117582, -0.016660134))
            ThreePointArc((-85.417117582, -0.016660134), (-86.434267849, -3.49121654), (-89.152345503, -5.8826995))
        make_face()
        with BuildLine():
            Line((-84.954269807, 0.720449987), (-85.454321016, 0.694648485))
            ThreePointArc((-85.454321016, 0.694648485), (-86.624103024, 3.772826912), (-89.152345503, 5.8826995))
            Line((-89.152345503, 5.8826995), (-88.901519399, 6.317143055))
            ThreePointArc((-88.901519399, 6.317143055), (-86.196704968, 4.034491764), (-84.954269807, 0.720449987))
        make_face()
        with BuildLine():
            ThreePointArc((-93.881039351, 6.718848668), (-97.518328321, 4.198356712), (-98.917096231, 0))
            Line((-98.917096231, 0), (-98.417045022, 0.025801502))
            ThreePointArc((-98.417045022, 0.025801502), (-97.244294171, 3.724374057), (-94.173322925, 6.09585442))
            ThreePointArc((-94.173322925, 6.09585442), (-94.03073306, 6.409017961), (-93.881039351, 6.718848668))
        make_face()
    extrude(amount=BOSS_EXTRUDE10_DEPTH)

    # Sketch6 → Cut-Extrude1 (cut)
    with BuildSketch(Plane(origin=(75, 0, 43.301270189), x_dir=(0.49999999999999406, 0, -0.8660254037844421), z_dir=(0.866025403784442, 0, 0.499999999999994))):
        with BuildLine():
            Line((-2.392290784, 10.5), (6.056631877, 10.5))
            Line((6.056631877, 10.5), (6.056631877, 5.798001155))
            ThreePointArc((6.056631877, 5.798001155), (5.17795222, 3.676680811), (3.056631877, 2.798001155))
            Line((3.056631877, 2.798001155), (0.607709216, 2.798001155))
            ThreePointArc((0.607709216, 2.798001155), (-1.513611128, 3.676680811), (-2.392290784, 5.798001155))
            Line((-2.392290784, 5.798001155), (-2.392290784, 10.5))
        make_face()
    extrude(amount=-CUT_EXTRUDE1_DEPTH, mode=Mode.SUBTRACT)

    # Sketch7 → Cut-Extrude2 (cut)
    with BuildSketch(Plane.XY.offset(-86.602540378)):
        with BuildLine():
            Line((-3.661362227, 10.5), (3.52679283, 10.5))
            Line((3.52679283, 10.5), (3.52679283, 5.841911445))
            ThreePointArc((3.52679283, 5.841911445), (2.648113174, 3.720591102), (0.52679283, 2.841911445))
            Line((0.52679283, 2.841911445), (-0.661362227, 2.841911445))
            ThreePointArc((-0.661362227, 2.841911445), (-2.782682571, 3.720591102), (-3.661362227, 5.841911445))
            Line((-3.661362227, 5.841911445), (-3.661362227, 10.5))
        make_face()
    extrude(amount=CUT_EXTRUDE2_DEPTH, mode=Mode.SUBTRACT)


solid = part.part
